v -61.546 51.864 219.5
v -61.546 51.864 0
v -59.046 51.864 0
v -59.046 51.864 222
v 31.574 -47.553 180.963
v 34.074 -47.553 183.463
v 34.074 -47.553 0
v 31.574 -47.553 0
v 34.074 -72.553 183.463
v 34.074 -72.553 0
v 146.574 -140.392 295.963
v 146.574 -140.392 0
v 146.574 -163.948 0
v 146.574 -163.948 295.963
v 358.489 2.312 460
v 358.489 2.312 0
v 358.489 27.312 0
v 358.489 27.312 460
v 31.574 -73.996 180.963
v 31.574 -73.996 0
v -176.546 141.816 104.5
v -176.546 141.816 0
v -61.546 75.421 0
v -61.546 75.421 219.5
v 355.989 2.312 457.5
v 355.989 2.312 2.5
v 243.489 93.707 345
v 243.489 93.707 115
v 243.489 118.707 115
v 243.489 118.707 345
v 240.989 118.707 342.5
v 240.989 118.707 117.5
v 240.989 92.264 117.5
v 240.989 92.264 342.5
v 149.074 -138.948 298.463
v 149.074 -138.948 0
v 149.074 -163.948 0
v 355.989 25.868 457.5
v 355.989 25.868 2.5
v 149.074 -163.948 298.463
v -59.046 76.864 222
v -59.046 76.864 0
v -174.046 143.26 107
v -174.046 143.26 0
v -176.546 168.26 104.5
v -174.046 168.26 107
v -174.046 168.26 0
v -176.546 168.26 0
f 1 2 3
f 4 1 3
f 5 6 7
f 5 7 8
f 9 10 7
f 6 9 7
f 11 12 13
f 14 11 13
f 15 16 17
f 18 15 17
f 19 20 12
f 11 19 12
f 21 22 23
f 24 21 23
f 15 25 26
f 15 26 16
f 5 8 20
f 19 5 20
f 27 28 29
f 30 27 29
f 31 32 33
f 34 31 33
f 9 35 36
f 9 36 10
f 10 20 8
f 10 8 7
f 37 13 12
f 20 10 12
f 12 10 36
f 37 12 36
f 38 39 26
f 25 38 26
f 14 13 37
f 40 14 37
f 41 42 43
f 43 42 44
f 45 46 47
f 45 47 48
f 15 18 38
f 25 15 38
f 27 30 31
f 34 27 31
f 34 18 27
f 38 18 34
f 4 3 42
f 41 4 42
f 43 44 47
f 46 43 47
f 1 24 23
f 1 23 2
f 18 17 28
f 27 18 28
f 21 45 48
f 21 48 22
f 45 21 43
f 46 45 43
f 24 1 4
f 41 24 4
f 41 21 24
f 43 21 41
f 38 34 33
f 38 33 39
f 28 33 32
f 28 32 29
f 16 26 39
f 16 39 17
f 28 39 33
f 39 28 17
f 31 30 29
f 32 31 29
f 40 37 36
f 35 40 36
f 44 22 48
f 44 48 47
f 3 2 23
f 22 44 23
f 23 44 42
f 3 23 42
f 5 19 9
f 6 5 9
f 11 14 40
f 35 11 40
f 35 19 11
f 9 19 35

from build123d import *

# Parameters (mm, degrees)
F1_DEPTH  = 222
F3_DEPTH  = 116.3962809568
F5_DEPTH  = 298.4629867977
F7_DEPTH  = 332.2089640623
F9_DEPTH  = 460
F11_DEPTH = 282.6562179452
F13_DEPTH = 282.6562179452


with BuildPart() as f1:
    # F0 (on Top) → F1 (new body)
    with BuildSketch(Plane.XY):
        Polygon((-174.045728147, 143.2596931669), (-174.045728147, 168.2596931669), (-176.545728147, 168.2596931669), (-176.545728147, 141.8163174939), (-61.545728147, 75.4210365371), (-61.545728147, 51.8644122101), (-59.045728147, 51.8644122101), (-59.045728147, 76.8644122101), align=None)
    extrude(amount=F1_DEPTH)

    # F2 (on face) → F3 (cut, through all)
    with BuildSketch(Plane.XZ.offset(-51.8644122101)):
        Polygon((-61.545728147, 222), (-176.545728147, 222), (-176.545728147, 104.5), (-61.545728147, 219.5), align=None)
        Polygon((-59.045728147, 222), (-61.545728147, 222), (-61.545728147, 219.5), align=None)
    extrude(amount=-F3_DEPTH, mode=Mode.SUBTRACT)


with BuildPart() as f5:
    # F4 (on Top) → F5 (new body)
    with BuildSketch(Plane.XY):
        Polygon((34.0739101171, -72.5529899385), (34.0739101171, -47.5529899385), (31.5739101171, -47.5529899385), (31.5739101171, -73.9963656115), (146.5739101171, -140.3916465683), (146.5739101171, -163.9482708954), (149.0739101171, -163.9482708954), (149.0739101171, -138.9482708954), align=None)
    extrude(amount=F5_DEPTH)

    # F6 (on face) → F7 (cut, through all)
    with BuildSketch(Plane.XZ.offset(163.9482708954)):
        Polygon((146.5739101172, 295.9629867977), (149.0739101172, 298.4629867977), (146.5739101172, 298.4629867977), align=None)
        Polygon((31.5739101171, 180.9629867977), (146.5739101172, 295.9629867977), (146.5739101172, 298.4629867977), (31.5739101171, 298.4629867977), align=None)
    extrude(amount=-F7_DEPTH, mode=Mode.SUBTRACT)


with BuildPart() as f9:
    # F8 (on Top) → F9 (new body)
    with BuildSketch(Plane.XY):
        Polygon((243.4885656552, 93.7069470498), (243.4885656552, 118.7069470498), (240.9885656552, 118.7069470498), (240.9885656552, 92.2635713768), (355.9885656552, 25.86829042), (355.9885656552, 2.311666093), (358.4885656552, 2.311666093), (358.4885656552, 27.311666093), align=None)
    extrude(amount=F9_DEPTH)

    # F10 (on face) → F11 (cut, through all)
    with BuildSketch(Plane(origin=(0, 118.7069470498, 0), x_dir=(-1, 0, 0), z_dir=(0, 1, 0))):
        Polygon((-243.4885656552, 345), (-243.4885656552, 460), (-358.4885656552, 460), align=None)
        Polygon((-240.9885656552, 460), (-243.4885656552, 460), (-243.4885656552, 345), (-240.9885656552, 342.5), align=None)
    extrude(amount=-F11_DEPTH, mode=Mode.SUBTRACT)

    # F12 (on face) → F13 (cut, through all)
    with BuildSketch(Plane(origin=(0, 118.7069470498, 0), x_dir=(-1, 0, 0), z_dir=(0, 1, 0))):
        Polygon((-358.4885656552, 0), (-243.4885656552, 0), (-243.4885656552, 115), align=None)
        Polygon((-243.4885656552, 115), (-243.4885656552, 0), (-240.9885656552, 0), (-240.9885656552, 117.5), align=None)
    extrude(amount=-F13_DEPTH, mode=Mode.SUBTRACT)


solid = Compound([f1.part, f5.part, f9.part])
